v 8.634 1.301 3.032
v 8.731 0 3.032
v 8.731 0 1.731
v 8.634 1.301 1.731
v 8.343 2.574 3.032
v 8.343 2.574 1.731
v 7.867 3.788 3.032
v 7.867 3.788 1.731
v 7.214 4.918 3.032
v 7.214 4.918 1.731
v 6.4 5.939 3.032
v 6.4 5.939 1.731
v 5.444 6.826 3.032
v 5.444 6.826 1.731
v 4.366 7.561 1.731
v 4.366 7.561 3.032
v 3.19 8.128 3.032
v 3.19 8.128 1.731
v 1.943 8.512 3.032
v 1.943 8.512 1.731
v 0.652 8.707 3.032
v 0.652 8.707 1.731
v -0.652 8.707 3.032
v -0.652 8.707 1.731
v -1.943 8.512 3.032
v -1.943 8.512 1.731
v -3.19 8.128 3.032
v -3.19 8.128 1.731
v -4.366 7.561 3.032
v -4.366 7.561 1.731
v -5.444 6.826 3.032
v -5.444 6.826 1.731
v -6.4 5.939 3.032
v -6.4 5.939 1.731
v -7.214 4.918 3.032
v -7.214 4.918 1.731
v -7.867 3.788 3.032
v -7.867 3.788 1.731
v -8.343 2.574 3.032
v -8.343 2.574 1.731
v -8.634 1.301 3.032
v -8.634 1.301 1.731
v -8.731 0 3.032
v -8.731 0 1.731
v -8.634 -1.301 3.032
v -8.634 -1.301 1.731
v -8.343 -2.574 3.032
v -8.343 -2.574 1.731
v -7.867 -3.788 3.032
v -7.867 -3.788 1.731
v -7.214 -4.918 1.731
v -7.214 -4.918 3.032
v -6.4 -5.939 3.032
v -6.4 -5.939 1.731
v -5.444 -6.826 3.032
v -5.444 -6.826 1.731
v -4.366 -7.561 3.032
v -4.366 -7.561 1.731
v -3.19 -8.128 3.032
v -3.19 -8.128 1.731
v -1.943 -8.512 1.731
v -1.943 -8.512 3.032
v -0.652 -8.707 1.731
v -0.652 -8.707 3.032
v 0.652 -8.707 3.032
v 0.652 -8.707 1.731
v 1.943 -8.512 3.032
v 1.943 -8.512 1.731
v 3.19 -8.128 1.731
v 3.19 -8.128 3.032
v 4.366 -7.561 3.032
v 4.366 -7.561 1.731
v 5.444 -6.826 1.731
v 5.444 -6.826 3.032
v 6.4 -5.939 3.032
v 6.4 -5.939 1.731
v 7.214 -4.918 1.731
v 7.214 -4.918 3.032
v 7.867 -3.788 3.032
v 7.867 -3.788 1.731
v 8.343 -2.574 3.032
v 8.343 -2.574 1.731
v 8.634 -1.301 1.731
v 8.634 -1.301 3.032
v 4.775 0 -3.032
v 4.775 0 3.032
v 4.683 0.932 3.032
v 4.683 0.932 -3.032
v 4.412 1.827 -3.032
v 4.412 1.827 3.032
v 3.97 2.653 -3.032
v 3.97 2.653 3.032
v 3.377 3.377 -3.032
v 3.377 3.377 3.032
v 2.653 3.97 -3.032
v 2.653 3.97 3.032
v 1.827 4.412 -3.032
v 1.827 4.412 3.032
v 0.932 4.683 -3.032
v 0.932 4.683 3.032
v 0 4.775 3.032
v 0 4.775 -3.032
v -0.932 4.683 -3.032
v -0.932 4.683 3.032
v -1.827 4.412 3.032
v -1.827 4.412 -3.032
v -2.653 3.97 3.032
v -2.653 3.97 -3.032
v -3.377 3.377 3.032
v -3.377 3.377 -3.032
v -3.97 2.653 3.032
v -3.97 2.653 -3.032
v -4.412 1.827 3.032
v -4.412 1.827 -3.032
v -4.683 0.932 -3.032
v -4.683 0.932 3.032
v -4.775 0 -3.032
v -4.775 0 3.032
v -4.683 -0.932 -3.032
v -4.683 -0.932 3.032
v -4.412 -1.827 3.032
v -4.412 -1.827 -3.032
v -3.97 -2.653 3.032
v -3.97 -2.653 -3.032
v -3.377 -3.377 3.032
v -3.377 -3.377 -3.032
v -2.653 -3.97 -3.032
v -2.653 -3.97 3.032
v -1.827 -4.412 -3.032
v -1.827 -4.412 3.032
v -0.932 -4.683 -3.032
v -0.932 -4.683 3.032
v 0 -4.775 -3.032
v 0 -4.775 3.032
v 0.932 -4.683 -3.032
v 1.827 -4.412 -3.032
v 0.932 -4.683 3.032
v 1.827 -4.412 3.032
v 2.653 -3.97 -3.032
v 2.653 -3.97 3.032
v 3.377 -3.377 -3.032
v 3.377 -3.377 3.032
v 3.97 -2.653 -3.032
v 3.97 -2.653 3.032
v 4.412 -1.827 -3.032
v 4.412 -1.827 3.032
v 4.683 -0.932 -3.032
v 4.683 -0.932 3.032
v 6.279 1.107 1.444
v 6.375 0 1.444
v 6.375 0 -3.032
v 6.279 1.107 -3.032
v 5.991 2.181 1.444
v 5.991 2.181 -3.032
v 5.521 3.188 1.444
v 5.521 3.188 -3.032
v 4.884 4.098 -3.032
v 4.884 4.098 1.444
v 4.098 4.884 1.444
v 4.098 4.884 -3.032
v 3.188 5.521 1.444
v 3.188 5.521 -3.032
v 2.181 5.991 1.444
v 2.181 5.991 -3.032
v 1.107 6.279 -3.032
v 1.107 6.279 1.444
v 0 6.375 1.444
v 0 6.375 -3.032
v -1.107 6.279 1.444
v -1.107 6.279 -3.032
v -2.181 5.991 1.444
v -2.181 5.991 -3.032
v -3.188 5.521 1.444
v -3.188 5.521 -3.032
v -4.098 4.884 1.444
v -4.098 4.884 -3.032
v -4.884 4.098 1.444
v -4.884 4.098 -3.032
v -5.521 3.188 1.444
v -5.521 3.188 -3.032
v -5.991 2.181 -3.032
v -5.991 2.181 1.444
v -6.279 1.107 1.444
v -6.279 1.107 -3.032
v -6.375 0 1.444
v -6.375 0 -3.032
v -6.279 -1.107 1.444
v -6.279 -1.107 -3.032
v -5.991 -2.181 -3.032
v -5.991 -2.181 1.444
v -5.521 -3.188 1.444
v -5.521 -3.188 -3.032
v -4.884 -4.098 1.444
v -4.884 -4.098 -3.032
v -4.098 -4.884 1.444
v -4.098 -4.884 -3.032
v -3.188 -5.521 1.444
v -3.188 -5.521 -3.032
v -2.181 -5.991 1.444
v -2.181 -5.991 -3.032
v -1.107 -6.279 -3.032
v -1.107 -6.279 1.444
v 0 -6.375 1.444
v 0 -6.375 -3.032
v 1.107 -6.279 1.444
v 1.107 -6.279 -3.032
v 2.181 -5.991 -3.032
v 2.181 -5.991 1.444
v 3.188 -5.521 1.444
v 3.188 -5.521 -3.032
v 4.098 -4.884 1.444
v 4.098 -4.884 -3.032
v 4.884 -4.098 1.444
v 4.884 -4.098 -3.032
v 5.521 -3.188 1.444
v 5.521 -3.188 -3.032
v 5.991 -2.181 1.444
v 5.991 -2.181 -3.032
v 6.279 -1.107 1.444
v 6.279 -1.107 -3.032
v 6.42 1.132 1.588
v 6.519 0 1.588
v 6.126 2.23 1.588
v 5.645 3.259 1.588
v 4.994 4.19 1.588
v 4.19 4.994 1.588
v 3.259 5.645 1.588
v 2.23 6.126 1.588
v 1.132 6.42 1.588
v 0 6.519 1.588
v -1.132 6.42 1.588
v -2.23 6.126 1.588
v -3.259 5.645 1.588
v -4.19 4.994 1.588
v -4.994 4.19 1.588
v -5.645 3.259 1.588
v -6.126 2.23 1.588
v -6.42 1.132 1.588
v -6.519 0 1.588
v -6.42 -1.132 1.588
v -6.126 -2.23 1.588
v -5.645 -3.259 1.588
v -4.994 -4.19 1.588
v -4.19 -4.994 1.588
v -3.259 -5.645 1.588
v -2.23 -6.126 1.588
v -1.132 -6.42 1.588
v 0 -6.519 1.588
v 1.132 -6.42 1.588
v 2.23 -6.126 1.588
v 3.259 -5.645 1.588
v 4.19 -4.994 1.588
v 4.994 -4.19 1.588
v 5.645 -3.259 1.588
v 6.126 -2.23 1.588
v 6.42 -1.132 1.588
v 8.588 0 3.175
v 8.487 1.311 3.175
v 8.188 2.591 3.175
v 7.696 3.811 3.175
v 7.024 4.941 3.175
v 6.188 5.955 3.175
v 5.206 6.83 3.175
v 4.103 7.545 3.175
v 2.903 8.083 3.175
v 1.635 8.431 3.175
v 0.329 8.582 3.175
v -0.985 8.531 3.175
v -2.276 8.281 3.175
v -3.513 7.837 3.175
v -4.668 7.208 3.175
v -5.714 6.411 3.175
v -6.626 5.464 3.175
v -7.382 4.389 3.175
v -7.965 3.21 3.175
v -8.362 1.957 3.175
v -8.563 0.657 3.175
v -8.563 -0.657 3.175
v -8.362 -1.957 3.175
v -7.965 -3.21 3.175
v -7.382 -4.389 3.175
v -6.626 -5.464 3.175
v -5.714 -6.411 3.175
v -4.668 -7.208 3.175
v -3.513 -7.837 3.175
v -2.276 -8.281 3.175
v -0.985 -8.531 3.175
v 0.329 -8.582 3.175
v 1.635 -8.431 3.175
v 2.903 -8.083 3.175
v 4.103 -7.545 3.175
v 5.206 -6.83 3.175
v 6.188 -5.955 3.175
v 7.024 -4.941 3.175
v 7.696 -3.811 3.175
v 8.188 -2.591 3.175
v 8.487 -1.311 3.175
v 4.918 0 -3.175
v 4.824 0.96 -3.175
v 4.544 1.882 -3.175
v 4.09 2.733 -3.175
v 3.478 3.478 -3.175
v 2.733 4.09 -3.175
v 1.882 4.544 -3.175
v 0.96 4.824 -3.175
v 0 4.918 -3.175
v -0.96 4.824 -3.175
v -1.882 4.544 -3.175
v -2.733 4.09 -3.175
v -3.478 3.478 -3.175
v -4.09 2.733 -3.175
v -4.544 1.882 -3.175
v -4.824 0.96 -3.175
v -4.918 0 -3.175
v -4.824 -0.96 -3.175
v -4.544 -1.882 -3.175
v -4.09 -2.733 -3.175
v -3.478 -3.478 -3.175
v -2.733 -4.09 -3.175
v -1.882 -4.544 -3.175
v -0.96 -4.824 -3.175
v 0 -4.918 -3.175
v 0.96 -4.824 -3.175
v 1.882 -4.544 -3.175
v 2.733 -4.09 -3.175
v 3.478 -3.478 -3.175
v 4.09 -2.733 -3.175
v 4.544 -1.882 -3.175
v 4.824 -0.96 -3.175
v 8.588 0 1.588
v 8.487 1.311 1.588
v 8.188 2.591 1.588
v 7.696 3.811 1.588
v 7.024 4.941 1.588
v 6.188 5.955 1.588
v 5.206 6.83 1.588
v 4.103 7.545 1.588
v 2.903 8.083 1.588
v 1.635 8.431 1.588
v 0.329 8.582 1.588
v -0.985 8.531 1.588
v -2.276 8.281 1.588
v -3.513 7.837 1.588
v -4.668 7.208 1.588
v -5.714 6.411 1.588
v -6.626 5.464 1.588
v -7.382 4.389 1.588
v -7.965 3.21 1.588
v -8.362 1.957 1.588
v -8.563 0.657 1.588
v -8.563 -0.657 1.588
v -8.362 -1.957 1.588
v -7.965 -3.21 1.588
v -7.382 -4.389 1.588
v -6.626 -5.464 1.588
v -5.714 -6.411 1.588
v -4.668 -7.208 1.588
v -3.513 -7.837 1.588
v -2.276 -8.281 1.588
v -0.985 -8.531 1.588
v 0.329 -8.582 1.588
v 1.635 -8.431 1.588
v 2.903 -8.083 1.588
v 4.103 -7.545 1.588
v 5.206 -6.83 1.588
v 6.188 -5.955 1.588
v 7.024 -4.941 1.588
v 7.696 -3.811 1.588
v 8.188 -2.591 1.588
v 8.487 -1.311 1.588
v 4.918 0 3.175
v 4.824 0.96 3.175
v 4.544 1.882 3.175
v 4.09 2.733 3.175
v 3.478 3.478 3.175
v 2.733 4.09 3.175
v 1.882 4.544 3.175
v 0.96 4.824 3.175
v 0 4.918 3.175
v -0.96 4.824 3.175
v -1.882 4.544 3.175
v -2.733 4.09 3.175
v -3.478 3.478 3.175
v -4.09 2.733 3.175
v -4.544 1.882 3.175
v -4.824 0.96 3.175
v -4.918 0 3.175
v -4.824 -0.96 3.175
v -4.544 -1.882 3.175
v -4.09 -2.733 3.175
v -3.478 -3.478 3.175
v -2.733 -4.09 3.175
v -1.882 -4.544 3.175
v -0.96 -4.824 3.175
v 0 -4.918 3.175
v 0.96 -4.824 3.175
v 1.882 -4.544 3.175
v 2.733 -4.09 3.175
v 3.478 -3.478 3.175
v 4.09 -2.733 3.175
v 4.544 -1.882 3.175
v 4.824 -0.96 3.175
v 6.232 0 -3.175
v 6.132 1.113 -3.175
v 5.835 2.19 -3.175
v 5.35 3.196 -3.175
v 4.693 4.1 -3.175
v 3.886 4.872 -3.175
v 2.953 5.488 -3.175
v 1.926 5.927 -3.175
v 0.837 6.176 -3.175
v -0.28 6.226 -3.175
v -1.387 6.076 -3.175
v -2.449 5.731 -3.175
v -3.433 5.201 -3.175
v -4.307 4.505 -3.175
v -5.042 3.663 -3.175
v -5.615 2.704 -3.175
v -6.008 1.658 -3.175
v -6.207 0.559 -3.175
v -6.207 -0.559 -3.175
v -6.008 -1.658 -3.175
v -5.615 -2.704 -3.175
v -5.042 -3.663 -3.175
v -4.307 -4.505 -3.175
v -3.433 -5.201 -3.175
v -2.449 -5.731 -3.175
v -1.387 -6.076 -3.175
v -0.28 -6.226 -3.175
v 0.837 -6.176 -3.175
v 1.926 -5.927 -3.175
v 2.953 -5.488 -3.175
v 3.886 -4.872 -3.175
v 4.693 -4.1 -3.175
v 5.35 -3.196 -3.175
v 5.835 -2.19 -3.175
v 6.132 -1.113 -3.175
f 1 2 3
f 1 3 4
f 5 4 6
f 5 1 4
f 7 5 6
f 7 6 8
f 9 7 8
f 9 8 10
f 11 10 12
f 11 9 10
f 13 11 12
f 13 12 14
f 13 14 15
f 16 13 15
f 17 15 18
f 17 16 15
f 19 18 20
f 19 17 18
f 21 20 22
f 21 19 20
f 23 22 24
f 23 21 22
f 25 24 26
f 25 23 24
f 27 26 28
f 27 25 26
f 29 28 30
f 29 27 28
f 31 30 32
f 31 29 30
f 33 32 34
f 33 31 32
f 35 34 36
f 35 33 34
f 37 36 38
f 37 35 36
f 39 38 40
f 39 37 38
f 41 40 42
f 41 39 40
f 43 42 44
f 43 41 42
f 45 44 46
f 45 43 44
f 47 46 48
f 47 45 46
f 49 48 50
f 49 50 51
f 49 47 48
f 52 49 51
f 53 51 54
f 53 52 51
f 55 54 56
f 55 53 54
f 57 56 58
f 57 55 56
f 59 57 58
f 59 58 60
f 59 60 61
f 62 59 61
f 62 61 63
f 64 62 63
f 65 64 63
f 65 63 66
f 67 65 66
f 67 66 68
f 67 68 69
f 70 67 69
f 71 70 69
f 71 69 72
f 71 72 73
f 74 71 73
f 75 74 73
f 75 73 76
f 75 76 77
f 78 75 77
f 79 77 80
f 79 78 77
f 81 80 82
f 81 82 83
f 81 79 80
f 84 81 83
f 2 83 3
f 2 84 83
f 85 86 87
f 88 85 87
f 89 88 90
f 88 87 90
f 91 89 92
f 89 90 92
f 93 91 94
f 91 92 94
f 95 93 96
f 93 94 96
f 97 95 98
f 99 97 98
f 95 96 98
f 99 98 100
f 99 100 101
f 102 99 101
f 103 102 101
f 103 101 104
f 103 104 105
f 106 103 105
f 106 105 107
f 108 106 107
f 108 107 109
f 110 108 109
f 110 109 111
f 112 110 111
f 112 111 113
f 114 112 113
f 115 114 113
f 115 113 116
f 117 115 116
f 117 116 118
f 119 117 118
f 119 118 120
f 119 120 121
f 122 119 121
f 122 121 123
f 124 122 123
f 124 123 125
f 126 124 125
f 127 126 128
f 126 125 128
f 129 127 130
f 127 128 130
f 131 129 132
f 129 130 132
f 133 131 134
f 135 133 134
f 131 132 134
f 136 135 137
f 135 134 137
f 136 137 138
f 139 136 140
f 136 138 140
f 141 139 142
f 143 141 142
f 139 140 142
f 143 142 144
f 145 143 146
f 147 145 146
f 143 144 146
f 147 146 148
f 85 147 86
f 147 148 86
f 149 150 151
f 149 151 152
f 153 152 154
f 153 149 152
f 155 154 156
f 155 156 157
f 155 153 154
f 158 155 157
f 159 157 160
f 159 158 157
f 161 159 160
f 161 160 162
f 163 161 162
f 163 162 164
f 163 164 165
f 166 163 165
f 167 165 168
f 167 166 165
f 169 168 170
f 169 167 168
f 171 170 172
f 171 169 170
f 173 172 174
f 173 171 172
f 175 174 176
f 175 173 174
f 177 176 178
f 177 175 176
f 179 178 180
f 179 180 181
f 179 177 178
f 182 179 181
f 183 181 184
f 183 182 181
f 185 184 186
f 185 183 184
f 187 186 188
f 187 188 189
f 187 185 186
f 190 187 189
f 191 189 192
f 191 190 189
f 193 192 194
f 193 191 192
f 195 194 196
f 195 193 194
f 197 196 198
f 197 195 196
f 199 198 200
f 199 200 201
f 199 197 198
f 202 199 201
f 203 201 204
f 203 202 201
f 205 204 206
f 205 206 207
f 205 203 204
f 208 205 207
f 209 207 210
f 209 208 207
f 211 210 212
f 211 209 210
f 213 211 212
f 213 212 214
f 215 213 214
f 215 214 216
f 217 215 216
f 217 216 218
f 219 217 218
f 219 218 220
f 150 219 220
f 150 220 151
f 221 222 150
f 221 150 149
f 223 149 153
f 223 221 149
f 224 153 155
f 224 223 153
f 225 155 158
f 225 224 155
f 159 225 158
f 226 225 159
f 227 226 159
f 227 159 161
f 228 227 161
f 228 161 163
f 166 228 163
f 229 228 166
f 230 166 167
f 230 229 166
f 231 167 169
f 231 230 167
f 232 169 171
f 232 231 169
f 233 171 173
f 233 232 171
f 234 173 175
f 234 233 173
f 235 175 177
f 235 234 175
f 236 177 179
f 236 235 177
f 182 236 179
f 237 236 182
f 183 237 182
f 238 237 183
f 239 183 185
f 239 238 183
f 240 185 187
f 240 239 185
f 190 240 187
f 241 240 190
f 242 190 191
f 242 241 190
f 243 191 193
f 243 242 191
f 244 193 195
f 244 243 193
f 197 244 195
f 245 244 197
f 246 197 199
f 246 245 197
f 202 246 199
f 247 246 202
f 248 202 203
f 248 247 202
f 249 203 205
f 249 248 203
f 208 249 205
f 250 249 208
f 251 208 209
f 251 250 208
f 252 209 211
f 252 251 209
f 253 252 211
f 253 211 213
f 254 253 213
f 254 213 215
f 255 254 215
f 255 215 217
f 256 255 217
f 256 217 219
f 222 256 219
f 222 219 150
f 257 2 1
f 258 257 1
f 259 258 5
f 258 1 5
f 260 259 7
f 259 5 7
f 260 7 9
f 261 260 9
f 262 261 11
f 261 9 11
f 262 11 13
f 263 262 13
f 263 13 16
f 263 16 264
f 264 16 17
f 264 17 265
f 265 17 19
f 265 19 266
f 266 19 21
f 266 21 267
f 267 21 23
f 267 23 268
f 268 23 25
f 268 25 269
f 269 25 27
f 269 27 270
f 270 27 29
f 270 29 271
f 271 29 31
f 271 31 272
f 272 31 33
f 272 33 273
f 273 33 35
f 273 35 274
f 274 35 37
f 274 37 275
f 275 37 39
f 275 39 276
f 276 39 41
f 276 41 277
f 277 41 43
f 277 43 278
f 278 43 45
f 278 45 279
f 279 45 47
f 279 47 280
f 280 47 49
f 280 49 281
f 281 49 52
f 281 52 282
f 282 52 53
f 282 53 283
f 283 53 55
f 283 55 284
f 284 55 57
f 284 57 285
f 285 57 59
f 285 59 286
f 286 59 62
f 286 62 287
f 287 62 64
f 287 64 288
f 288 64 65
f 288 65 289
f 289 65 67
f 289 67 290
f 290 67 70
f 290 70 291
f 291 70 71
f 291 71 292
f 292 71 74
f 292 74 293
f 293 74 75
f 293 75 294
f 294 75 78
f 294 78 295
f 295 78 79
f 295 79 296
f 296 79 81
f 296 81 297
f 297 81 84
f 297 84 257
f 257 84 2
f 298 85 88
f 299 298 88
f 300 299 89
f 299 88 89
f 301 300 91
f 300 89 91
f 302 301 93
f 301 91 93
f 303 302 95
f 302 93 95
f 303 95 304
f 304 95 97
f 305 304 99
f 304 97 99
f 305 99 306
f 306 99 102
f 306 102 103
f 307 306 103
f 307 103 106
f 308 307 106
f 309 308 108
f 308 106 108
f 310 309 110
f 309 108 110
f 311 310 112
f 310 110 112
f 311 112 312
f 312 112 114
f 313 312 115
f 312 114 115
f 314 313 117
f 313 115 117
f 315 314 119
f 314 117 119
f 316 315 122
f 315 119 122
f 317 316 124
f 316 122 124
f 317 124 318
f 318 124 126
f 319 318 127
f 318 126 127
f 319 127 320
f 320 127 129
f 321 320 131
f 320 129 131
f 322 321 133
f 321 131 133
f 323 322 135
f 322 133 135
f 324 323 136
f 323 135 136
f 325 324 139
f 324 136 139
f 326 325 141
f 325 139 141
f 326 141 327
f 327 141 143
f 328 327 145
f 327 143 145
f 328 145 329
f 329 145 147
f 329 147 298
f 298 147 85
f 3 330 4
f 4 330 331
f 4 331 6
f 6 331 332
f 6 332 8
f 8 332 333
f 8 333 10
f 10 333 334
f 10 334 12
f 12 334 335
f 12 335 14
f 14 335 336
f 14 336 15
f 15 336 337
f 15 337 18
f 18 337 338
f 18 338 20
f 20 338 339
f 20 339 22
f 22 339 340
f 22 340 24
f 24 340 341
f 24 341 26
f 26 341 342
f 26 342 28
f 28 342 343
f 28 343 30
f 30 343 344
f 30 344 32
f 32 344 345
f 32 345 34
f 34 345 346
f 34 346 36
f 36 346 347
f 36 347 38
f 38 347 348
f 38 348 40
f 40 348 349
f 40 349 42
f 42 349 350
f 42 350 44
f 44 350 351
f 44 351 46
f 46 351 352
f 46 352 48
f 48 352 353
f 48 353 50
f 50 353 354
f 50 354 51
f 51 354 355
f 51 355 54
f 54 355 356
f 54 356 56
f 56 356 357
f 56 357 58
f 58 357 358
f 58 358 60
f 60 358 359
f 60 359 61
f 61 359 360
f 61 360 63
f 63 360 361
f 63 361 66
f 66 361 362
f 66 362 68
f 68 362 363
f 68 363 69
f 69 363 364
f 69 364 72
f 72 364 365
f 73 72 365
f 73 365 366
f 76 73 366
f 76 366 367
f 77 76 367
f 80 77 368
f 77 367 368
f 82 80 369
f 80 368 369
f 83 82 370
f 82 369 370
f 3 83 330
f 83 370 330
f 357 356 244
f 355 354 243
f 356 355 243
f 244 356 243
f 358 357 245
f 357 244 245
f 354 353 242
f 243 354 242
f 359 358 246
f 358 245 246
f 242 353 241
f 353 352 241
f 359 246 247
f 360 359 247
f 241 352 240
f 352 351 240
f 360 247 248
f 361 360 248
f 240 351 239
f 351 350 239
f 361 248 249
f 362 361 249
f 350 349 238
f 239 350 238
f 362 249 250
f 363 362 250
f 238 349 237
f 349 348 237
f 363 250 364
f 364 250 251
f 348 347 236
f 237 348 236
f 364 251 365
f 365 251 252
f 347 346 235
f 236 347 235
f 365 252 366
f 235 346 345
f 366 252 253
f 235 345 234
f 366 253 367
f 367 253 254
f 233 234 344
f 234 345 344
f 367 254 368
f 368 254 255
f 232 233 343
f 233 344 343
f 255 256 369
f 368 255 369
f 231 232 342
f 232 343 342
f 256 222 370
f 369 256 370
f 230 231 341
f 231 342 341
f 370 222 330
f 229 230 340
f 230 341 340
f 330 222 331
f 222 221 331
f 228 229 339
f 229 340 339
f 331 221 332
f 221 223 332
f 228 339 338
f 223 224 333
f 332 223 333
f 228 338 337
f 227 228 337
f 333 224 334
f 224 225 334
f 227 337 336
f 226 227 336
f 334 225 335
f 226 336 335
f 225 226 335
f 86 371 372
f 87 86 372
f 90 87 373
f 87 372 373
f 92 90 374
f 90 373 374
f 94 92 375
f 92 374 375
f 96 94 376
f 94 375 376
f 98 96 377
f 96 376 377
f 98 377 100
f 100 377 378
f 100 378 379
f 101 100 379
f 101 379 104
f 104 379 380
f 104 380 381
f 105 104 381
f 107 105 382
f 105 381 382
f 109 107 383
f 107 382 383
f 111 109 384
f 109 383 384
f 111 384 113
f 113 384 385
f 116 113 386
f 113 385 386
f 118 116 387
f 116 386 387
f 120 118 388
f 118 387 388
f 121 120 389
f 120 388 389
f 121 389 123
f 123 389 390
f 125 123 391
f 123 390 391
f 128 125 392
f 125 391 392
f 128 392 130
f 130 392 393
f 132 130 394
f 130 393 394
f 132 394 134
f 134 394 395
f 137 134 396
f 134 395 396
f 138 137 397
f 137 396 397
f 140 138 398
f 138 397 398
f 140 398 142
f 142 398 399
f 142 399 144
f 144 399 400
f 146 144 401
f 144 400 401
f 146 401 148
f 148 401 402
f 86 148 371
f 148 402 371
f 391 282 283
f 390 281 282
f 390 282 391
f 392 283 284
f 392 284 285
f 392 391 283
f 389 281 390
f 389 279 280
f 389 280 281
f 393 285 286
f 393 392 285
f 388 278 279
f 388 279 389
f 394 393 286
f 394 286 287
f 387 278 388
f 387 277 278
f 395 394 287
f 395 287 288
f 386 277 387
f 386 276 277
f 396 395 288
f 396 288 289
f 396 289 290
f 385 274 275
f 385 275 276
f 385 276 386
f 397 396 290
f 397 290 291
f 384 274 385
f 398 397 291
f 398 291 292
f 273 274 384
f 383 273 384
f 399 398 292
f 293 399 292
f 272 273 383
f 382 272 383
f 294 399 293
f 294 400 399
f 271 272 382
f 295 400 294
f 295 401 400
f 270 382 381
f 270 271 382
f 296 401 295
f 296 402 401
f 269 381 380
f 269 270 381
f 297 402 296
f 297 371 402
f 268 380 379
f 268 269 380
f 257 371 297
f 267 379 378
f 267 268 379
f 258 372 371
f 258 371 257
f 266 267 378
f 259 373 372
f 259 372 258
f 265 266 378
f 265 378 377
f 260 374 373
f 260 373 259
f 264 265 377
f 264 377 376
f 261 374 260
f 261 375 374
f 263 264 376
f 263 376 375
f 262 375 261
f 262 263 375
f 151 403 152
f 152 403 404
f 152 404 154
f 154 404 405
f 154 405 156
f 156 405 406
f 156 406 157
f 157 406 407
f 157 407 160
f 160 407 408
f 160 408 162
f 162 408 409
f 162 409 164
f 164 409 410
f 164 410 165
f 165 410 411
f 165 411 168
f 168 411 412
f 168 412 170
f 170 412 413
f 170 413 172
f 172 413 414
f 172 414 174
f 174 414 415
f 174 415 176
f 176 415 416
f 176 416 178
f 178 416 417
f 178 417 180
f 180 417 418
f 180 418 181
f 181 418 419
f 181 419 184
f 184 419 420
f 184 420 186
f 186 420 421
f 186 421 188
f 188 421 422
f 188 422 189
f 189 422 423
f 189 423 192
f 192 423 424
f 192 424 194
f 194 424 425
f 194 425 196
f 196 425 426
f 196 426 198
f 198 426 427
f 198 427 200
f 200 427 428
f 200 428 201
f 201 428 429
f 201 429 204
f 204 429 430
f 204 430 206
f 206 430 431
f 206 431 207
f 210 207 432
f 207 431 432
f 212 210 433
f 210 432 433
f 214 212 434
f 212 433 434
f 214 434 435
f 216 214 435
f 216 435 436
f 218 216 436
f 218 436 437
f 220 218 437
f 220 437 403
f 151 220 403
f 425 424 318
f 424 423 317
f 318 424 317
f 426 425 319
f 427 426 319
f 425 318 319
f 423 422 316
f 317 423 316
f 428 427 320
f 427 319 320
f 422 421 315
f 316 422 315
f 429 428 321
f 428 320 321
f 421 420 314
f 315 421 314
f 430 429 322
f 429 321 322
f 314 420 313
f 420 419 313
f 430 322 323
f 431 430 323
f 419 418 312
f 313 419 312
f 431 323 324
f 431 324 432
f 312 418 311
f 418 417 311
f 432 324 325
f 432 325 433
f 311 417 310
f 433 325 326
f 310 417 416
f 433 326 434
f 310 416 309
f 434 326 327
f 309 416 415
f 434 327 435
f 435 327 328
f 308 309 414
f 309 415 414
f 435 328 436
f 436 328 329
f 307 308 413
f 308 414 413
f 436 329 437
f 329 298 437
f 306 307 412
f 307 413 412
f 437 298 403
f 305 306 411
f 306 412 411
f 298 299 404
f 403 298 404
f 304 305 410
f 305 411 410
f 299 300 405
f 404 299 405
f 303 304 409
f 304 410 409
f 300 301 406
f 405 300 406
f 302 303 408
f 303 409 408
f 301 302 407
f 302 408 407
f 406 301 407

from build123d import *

# Parameters (mm, degrees)
BOSS_EXTRUDE1_START = 3.175
SKETCH3_R           = 8.73125
SKETCH3_R_2         = 4.7752
BOSS_EXTRUDE1_DEPTH = 1.5875
BOSS_EXTRUDE2_START = 1.5875
SKETCH4_R           = 6.3754
SKETCH4_R_2         = 4.7752
BOSS_EXTRUDE2_DEPTH = 4.7625
CHAMFER1_SIZE       = 0.143256


with BuildPart() as part:
    # Sketch3 → Boss-Extrude1 (new body)
    with BuildSketch(Plane.XY.offset(BOSS_EXTRUDE1_START)):
        Circle(SKETCH3_R)
        Circle(SKETCH3_R_2, mode=Mode.SUBTRACT)
    extrude(amount=-BOSS_EXTRUDE1_DEPTH)

    # Sketch4 → Boss-Extrude2 (add)
    with BuildSketch(Plane.XY.offset(BOSS_EXTRUDE2_START)):
        Circle(SKETCH4_R)
        Circle(SKETCH4_R_2, mode=Mode.SUBTRACT)
    extrude(amount=-BOSS_EXTRUDE2_DEPTH)

    # Chamfer1
    chamfer1_edges = [part.edges().sort_by_distance(p)[0] for p in [
        (-4.7752, 0, -3.175),
        (-6.3754, 0, 1.5875),
        (-8.73125, 0, 3.175),
        (-8.73125, 0, 1.5875),
        (-4.7752, 0, 3.175),
        (-6.3754, 0, -3.175),
    ]]
    chamfer(chamfer1_edges, length=CHAMFER1_SIZE)


solid = part.part
